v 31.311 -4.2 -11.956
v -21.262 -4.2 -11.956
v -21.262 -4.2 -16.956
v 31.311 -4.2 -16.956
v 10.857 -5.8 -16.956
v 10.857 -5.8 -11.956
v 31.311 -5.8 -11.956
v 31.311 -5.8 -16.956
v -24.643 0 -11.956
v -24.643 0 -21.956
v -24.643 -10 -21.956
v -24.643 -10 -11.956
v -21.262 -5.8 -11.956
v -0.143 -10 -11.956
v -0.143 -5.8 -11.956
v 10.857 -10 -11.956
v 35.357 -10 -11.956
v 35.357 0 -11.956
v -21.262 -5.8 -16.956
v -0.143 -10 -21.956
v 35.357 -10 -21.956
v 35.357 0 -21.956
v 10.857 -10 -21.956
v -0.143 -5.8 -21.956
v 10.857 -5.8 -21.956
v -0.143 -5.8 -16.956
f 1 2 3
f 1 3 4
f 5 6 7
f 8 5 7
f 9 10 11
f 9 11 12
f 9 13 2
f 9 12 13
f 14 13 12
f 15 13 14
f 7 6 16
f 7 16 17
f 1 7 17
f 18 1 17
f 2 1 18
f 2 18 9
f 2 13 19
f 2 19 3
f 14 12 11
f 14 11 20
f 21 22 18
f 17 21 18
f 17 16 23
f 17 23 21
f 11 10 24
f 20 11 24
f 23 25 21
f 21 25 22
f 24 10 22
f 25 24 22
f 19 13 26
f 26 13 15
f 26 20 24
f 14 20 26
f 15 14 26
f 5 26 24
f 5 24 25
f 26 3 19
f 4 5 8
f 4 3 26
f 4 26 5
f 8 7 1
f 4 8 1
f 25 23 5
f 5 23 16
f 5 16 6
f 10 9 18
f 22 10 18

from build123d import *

# Parameters (mm, degrees)
F0_W     = 60
F0_H     = 10
F1_DEPTH = 10
F2_W     = 52.573141
F2_H     = 1.6
F3_DEPTH = 5
F4_W     = 11
F4_H     = 4.2
F5_DEPTH = 10.001


with BuildPart() as f1:
    # F0 (on Front) → F1 (new body)
    with BuildSketch(Plane.XZ):
        with Locations((5.357166, -16.956311)):
            Rectangle(F0_W, F0_H)
    extrude(amount=F1_DEPTH)

    # F2 (on face) → F3 (cut)
    with BuildSketch(Plane.XY.offset(-11.956311)):
        with Locations((5.024185, -5)):
            Rectangle(F2_W, F2_H)
    extrude(amount=-F3_DEPTH, mode=Mode.SUBTRACT)

    # F4 (on face) → F5 (cut, through all)
    with BuildSketch(Plane.XY.offset(-11.956311)):
        with Locations((5.357166, -7.9)):
            Rectangle(F4_W, F4_H)
    extrude(amount=-F5_DEPTH, mode=Mode.SUBTRACT)


solid = f1.part
